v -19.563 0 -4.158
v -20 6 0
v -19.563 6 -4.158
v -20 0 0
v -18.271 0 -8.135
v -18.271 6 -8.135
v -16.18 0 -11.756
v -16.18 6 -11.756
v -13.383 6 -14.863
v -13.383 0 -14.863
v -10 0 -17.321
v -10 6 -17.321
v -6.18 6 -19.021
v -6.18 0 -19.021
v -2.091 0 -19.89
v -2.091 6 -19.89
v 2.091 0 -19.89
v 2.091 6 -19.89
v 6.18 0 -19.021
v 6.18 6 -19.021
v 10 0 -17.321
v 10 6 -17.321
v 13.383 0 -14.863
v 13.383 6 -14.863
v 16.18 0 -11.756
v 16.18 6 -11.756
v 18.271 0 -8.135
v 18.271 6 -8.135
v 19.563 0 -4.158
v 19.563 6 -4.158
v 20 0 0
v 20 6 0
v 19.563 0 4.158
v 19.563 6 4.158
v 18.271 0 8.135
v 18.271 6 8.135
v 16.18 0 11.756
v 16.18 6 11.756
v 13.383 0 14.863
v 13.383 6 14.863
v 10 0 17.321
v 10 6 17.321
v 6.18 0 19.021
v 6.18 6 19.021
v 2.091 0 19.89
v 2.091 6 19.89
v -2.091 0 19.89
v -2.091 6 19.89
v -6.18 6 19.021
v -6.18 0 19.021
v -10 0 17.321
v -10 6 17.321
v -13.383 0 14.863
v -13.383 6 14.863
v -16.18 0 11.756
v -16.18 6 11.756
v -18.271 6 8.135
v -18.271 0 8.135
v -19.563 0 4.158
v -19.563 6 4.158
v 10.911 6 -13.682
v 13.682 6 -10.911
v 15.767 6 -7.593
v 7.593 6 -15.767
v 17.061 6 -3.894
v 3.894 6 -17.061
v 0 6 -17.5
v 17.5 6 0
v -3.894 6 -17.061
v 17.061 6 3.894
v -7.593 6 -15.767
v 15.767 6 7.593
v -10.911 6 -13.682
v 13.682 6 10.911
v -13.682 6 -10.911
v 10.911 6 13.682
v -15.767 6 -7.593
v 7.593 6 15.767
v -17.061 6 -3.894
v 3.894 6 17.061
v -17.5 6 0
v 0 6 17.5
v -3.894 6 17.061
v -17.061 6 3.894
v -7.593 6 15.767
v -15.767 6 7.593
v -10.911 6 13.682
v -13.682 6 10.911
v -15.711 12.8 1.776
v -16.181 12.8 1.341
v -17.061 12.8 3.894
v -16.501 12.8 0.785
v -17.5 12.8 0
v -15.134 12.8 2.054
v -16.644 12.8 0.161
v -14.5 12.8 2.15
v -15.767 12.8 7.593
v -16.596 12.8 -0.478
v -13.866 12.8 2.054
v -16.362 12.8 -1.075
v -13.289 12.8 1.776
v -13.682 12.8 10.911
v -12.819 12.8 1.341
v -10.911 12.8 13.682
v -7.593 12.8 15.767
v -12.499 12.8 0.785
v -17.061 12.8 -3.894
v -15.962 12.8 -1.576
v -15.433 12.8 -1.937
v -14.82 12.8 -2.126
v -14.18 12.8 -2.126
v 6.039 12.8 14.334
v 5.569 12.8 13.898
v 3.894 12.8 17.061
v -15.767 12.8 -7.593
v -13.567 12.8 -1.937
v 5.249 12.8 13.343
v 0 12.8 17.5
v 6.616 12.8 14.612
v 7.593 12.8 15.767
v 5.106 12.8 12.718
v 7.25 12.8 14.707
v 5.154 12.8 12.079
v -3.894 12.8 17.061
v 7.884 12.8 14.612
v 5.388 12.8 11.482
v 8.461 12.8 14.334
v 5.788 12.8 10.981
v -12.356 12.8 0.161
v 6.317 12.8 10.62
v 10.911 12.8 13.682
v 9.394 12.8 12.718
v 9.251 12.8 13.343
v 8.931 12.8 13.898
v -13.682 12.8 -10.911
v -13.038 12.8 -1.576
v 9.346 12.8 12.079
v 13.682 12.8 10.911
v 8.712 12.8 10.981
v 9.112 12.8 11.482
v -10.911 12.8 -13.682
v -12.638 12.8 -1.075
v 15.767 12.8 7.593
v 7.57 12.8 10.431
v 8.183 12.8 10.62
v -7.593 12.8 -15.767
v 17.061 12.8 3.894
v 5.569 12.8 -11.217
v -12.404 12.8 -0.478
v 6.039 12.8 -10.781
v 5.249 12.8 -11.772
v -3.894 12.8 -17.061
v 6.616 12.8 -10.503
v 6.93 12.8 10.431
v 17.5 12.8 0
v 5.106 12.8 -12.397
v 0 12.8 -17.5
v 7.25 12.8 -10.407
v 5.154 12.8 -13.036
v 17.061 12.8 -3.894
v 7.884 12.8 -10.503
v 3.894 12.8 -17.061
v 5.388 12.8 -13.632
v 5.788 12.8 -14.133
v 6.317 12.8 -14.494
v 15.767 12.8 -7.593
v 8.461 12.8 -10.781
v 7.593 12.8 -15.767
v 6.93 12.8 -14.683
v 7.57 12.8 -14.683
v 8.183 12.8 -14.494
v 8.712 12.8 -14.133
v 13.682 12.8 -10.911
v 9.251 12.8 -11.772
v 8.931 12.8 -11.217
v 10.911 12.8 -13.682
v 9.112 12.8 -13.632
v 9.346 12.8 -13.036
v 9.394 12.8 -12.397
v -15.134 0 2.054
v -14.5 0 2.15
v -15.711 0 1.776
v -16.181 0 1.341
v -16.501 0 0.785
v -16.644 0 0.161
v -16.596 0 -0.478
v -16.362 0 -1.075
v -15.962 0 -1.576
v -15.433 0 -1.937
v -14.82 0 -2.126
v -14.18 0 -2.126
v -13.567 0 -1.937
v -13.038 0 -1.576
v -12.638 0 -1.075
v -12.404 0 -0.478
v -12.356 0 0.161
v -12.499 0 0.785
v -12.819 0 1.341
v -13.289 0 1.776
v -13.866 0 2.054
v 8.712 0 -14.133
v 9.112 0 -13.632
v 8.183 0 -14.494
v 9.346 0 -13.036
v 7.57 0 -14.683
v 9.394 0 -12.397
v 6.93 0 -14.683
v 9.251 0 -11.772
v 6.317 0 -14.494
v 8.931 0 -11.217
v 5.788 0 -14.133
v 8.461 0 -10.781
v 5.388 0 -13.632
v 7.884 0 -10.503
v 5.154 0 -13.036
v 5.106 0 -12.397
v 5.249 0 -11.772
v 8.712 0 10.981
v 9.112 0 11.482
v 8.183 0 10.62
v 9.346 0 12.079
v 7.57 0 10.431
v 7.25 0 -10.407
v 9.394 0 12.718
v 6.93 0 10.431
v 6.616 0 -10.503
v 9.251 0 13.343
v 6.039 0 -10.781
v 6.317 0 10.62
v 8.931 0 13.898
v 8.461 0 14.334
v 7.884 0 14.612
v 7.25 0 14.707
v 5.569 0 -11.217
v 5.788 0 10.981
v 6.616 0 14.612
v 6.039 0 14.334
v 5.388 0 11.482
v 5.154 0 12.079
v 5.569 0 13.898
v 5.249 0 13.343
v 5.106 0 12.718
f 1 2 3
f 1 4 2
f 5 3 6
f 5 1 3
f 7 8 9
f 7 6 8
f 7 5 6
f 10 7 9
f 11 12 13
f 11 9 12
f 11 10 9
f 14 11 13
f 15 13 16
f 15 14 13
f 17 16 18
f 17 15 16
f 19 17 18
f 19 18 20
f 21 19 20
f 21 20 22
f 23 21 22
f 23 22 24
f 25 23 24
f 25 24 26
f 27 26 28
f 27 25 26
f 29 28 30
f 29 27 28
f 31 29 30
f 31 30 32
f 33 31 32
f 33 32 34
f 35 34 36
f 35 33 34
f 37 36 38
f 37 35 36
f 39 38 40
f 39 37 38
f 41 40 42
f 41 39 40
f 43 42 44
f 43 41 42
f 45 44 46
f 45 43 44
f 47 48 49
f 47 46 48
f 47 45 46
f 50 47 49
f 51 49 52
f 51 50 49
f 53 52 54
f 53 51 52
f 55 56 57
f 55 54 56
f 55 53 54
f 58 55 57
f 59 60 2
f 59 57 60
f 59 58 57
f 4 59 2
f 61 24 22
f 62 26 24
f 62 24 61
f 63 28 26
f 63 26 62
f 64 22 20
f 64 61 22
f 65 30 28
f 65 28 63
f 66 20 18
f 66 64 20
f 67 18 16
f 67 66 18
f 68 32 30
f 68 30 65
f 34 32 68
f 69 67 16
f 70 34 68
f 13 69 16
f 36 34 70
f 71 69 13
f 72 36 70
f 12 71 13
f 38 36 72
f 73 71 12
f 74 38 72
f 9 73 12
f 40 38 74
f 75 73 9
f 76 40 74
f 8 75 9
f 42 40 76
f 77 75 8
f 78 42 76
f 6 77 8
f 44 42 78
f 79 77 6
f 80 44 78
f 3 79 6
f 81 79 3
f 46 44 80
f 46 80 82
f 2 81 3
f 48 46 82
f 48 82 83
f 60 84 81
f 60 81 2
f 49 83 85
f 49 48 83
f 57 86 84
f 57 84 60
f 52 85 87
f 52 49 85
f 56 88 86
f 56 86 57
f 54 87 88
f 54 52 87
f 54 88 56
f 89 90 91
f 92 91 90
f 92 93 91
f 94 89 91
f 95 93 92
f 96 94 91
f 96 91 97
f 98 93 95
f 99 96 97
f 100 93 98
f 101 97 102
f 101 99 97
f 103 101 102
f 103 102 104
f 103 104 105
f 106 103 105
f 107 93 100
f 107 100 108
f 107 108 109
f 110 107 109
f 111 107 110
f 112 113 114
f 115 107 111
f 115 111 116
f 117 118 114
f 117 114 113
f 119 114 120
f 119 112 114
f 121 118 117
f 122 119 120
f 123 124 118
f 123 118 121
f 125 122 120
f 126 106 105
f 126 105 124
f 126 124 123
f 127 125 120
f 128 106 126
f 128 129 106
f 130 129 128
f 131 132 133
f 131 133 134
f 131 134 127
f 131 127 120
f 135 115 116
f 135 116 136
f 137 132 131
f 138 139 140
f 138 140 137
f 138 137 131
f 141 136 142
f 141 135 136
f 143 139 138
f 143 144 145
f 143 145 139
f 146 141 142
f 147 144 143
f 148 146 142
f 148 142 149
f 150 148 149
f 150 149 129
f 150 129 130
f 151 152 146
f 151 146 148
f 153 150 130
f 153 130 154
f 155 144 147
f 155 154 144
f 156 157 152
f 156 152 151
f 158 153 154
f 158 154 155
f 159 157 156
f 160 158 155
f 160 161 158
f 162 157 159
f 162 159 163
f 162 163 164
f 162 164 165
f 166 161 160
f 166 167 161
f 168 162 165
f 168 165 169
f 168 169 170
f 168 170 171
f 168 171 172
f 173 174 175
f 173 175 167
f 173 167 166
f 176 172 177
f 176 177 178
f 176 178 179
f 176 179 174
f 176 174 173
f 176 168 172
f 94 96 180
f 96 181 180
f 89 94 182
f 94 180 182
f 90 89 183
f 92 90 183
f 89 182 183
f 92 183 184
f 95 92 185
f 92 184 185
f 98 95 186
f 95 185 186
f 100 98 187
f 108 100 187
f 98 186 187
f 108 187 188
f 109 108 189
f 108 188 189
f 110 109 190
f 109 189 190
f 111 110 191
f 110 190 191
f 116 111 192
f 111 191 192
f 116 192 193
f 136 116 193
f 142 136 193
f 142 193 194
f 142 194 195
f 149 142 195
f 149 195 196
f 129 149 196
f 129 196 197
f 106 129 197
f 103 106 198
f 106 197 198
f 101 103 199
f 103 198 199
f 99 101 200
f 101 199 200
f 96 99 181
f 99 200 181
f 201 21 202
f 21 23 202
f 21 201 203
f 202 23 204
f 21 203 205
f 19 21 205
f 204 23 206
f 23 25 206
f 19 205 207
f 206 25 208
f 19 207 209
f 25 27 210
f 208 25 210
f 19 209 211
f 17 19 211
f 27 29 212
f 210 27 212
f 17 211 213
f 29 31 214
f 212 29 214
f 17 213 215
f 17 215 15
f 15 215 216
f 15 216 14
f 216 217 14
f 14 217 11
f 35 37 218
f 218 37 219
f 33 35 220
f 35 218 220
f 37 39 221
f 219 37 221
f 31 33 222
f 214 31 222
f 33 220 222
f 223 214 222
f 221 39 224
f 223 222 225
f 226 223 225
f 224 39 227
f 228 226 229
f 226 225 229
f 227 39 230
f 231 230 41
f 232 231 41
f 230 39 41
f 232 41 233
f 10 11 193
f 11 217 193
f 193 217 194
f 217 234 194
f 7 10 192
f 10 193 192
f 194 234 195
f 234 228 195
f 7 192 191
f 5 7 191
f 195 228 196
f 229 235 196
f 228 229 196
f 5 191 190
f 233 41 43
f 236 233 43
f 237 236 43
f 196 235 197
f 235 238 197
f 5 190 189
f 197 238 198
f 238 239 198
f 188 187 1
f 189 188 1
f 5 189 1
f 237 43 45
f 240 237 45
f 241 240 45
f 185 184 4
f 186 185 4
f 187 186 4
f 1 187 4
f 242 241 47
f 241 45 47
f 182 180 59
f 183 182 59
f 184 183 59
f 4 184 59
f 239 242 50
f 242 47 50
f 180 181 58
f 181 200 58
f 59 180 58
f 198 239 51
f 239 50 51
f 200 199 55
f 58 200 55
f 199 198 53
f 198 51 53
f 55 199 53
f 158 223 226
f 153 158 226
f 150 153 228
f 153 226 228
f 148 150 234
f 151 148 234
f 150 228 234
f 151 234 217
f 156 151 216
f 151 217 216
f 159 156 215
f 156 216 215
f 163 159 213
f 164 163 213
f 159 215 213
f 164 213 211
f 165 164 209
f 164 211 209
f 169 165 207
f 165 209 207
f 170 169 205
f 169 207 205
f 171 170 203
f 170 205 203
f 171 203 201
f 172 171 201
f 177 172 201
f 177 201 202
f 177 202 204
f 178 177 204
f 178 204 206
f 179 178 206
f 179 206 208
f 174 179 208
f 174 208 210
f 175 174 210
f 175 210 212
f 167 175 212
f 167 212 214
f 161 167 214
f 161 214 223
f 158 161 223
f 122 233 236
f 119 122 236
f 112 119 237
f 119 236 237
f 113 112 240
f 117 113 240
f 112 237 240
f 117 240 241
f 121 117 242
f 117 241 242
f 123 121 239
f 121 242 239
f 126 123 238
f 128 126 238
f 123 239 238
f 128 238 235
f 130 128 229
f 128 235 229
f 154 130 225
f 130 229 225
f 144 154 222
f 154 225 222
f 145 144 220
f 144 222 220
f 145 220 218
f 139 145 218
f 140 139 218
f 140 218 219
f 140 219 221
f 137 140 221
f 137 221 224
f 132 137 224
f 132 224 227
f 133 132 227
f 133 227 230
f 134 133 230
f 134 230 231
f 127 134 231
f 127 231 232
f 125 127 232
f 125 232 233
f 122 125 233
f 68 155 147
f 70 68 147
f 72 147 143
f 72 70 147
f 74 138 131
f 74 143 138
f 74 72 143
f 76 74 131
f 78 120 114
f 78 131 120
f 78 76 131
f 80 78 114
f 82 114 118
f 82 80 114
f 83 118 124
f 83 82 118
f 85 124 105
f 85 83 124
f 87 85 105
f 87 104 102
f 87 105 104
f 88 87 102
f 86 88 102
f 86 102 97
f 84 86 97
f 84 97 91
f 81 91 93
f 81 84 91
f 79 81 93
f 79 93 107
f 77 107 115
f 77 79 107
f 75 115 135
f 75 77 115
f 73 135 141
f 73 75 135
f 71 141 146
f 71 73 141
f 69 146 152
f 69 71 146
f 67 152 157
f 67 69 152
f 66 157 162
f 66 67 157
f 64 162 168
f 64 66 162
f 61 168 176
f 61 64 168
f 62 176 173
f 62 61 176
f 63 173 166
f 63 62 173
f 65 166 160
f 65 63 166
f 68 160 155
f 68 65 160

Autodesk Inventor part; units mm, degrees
ref_plane "YZ Plane" through (0, 0, 0) normal (1, 0, 0) x (0, 1, 0)
ref_plane "XZ Plane" through (0, 0, 0) normal (0, 1, 0) x (-1, 0, 0)
ref_plane "XY Plane" through (0, 0, 0) normal (0, 0, 1) x (1, 0, 0)
sketch "Sketch1" plane through (0, 0, 0) normal (0, 1, 0) x (-1, 0, 0)
  circle A0 centre (0, 0) radius 20
  dimension "d0" = 40
extrude "Extrusion1" add sketch "Sketch1" along normal blind 6
sketch "Sketch2" plane through (0, 6, 0) normal (0, 1, 0) x (1, 0, 0)
  circle A0 centre (0, 0) radius 17.5
  dimension "d3" = 35
extrude "Extrusion2" add sketch "Sketch2" along normal blind 6.8
sketch "Sketch3" plane through (0, 12.8, 0) normal (0, 1, 0) x (1, 0, 0)
  circle A0 centre (0, 0) radius 14.5 construction
  line L0 (0, 0) -> (-14.5, 0) construction
  point P0 (7.25, -12.5574)
  point P1 (7.25, 12.5574)
  dimension "d6" = 29
  dimension "d9" = 360
hole "Hole1" at (-14.5, 12.8, 0) at (7.25, 12.8, 12.5574) at (7.25, 12.8, -12.5574) direction (0, -1, 0) diameter 4.3 end through all
properties part number "Arm - slew column B"
